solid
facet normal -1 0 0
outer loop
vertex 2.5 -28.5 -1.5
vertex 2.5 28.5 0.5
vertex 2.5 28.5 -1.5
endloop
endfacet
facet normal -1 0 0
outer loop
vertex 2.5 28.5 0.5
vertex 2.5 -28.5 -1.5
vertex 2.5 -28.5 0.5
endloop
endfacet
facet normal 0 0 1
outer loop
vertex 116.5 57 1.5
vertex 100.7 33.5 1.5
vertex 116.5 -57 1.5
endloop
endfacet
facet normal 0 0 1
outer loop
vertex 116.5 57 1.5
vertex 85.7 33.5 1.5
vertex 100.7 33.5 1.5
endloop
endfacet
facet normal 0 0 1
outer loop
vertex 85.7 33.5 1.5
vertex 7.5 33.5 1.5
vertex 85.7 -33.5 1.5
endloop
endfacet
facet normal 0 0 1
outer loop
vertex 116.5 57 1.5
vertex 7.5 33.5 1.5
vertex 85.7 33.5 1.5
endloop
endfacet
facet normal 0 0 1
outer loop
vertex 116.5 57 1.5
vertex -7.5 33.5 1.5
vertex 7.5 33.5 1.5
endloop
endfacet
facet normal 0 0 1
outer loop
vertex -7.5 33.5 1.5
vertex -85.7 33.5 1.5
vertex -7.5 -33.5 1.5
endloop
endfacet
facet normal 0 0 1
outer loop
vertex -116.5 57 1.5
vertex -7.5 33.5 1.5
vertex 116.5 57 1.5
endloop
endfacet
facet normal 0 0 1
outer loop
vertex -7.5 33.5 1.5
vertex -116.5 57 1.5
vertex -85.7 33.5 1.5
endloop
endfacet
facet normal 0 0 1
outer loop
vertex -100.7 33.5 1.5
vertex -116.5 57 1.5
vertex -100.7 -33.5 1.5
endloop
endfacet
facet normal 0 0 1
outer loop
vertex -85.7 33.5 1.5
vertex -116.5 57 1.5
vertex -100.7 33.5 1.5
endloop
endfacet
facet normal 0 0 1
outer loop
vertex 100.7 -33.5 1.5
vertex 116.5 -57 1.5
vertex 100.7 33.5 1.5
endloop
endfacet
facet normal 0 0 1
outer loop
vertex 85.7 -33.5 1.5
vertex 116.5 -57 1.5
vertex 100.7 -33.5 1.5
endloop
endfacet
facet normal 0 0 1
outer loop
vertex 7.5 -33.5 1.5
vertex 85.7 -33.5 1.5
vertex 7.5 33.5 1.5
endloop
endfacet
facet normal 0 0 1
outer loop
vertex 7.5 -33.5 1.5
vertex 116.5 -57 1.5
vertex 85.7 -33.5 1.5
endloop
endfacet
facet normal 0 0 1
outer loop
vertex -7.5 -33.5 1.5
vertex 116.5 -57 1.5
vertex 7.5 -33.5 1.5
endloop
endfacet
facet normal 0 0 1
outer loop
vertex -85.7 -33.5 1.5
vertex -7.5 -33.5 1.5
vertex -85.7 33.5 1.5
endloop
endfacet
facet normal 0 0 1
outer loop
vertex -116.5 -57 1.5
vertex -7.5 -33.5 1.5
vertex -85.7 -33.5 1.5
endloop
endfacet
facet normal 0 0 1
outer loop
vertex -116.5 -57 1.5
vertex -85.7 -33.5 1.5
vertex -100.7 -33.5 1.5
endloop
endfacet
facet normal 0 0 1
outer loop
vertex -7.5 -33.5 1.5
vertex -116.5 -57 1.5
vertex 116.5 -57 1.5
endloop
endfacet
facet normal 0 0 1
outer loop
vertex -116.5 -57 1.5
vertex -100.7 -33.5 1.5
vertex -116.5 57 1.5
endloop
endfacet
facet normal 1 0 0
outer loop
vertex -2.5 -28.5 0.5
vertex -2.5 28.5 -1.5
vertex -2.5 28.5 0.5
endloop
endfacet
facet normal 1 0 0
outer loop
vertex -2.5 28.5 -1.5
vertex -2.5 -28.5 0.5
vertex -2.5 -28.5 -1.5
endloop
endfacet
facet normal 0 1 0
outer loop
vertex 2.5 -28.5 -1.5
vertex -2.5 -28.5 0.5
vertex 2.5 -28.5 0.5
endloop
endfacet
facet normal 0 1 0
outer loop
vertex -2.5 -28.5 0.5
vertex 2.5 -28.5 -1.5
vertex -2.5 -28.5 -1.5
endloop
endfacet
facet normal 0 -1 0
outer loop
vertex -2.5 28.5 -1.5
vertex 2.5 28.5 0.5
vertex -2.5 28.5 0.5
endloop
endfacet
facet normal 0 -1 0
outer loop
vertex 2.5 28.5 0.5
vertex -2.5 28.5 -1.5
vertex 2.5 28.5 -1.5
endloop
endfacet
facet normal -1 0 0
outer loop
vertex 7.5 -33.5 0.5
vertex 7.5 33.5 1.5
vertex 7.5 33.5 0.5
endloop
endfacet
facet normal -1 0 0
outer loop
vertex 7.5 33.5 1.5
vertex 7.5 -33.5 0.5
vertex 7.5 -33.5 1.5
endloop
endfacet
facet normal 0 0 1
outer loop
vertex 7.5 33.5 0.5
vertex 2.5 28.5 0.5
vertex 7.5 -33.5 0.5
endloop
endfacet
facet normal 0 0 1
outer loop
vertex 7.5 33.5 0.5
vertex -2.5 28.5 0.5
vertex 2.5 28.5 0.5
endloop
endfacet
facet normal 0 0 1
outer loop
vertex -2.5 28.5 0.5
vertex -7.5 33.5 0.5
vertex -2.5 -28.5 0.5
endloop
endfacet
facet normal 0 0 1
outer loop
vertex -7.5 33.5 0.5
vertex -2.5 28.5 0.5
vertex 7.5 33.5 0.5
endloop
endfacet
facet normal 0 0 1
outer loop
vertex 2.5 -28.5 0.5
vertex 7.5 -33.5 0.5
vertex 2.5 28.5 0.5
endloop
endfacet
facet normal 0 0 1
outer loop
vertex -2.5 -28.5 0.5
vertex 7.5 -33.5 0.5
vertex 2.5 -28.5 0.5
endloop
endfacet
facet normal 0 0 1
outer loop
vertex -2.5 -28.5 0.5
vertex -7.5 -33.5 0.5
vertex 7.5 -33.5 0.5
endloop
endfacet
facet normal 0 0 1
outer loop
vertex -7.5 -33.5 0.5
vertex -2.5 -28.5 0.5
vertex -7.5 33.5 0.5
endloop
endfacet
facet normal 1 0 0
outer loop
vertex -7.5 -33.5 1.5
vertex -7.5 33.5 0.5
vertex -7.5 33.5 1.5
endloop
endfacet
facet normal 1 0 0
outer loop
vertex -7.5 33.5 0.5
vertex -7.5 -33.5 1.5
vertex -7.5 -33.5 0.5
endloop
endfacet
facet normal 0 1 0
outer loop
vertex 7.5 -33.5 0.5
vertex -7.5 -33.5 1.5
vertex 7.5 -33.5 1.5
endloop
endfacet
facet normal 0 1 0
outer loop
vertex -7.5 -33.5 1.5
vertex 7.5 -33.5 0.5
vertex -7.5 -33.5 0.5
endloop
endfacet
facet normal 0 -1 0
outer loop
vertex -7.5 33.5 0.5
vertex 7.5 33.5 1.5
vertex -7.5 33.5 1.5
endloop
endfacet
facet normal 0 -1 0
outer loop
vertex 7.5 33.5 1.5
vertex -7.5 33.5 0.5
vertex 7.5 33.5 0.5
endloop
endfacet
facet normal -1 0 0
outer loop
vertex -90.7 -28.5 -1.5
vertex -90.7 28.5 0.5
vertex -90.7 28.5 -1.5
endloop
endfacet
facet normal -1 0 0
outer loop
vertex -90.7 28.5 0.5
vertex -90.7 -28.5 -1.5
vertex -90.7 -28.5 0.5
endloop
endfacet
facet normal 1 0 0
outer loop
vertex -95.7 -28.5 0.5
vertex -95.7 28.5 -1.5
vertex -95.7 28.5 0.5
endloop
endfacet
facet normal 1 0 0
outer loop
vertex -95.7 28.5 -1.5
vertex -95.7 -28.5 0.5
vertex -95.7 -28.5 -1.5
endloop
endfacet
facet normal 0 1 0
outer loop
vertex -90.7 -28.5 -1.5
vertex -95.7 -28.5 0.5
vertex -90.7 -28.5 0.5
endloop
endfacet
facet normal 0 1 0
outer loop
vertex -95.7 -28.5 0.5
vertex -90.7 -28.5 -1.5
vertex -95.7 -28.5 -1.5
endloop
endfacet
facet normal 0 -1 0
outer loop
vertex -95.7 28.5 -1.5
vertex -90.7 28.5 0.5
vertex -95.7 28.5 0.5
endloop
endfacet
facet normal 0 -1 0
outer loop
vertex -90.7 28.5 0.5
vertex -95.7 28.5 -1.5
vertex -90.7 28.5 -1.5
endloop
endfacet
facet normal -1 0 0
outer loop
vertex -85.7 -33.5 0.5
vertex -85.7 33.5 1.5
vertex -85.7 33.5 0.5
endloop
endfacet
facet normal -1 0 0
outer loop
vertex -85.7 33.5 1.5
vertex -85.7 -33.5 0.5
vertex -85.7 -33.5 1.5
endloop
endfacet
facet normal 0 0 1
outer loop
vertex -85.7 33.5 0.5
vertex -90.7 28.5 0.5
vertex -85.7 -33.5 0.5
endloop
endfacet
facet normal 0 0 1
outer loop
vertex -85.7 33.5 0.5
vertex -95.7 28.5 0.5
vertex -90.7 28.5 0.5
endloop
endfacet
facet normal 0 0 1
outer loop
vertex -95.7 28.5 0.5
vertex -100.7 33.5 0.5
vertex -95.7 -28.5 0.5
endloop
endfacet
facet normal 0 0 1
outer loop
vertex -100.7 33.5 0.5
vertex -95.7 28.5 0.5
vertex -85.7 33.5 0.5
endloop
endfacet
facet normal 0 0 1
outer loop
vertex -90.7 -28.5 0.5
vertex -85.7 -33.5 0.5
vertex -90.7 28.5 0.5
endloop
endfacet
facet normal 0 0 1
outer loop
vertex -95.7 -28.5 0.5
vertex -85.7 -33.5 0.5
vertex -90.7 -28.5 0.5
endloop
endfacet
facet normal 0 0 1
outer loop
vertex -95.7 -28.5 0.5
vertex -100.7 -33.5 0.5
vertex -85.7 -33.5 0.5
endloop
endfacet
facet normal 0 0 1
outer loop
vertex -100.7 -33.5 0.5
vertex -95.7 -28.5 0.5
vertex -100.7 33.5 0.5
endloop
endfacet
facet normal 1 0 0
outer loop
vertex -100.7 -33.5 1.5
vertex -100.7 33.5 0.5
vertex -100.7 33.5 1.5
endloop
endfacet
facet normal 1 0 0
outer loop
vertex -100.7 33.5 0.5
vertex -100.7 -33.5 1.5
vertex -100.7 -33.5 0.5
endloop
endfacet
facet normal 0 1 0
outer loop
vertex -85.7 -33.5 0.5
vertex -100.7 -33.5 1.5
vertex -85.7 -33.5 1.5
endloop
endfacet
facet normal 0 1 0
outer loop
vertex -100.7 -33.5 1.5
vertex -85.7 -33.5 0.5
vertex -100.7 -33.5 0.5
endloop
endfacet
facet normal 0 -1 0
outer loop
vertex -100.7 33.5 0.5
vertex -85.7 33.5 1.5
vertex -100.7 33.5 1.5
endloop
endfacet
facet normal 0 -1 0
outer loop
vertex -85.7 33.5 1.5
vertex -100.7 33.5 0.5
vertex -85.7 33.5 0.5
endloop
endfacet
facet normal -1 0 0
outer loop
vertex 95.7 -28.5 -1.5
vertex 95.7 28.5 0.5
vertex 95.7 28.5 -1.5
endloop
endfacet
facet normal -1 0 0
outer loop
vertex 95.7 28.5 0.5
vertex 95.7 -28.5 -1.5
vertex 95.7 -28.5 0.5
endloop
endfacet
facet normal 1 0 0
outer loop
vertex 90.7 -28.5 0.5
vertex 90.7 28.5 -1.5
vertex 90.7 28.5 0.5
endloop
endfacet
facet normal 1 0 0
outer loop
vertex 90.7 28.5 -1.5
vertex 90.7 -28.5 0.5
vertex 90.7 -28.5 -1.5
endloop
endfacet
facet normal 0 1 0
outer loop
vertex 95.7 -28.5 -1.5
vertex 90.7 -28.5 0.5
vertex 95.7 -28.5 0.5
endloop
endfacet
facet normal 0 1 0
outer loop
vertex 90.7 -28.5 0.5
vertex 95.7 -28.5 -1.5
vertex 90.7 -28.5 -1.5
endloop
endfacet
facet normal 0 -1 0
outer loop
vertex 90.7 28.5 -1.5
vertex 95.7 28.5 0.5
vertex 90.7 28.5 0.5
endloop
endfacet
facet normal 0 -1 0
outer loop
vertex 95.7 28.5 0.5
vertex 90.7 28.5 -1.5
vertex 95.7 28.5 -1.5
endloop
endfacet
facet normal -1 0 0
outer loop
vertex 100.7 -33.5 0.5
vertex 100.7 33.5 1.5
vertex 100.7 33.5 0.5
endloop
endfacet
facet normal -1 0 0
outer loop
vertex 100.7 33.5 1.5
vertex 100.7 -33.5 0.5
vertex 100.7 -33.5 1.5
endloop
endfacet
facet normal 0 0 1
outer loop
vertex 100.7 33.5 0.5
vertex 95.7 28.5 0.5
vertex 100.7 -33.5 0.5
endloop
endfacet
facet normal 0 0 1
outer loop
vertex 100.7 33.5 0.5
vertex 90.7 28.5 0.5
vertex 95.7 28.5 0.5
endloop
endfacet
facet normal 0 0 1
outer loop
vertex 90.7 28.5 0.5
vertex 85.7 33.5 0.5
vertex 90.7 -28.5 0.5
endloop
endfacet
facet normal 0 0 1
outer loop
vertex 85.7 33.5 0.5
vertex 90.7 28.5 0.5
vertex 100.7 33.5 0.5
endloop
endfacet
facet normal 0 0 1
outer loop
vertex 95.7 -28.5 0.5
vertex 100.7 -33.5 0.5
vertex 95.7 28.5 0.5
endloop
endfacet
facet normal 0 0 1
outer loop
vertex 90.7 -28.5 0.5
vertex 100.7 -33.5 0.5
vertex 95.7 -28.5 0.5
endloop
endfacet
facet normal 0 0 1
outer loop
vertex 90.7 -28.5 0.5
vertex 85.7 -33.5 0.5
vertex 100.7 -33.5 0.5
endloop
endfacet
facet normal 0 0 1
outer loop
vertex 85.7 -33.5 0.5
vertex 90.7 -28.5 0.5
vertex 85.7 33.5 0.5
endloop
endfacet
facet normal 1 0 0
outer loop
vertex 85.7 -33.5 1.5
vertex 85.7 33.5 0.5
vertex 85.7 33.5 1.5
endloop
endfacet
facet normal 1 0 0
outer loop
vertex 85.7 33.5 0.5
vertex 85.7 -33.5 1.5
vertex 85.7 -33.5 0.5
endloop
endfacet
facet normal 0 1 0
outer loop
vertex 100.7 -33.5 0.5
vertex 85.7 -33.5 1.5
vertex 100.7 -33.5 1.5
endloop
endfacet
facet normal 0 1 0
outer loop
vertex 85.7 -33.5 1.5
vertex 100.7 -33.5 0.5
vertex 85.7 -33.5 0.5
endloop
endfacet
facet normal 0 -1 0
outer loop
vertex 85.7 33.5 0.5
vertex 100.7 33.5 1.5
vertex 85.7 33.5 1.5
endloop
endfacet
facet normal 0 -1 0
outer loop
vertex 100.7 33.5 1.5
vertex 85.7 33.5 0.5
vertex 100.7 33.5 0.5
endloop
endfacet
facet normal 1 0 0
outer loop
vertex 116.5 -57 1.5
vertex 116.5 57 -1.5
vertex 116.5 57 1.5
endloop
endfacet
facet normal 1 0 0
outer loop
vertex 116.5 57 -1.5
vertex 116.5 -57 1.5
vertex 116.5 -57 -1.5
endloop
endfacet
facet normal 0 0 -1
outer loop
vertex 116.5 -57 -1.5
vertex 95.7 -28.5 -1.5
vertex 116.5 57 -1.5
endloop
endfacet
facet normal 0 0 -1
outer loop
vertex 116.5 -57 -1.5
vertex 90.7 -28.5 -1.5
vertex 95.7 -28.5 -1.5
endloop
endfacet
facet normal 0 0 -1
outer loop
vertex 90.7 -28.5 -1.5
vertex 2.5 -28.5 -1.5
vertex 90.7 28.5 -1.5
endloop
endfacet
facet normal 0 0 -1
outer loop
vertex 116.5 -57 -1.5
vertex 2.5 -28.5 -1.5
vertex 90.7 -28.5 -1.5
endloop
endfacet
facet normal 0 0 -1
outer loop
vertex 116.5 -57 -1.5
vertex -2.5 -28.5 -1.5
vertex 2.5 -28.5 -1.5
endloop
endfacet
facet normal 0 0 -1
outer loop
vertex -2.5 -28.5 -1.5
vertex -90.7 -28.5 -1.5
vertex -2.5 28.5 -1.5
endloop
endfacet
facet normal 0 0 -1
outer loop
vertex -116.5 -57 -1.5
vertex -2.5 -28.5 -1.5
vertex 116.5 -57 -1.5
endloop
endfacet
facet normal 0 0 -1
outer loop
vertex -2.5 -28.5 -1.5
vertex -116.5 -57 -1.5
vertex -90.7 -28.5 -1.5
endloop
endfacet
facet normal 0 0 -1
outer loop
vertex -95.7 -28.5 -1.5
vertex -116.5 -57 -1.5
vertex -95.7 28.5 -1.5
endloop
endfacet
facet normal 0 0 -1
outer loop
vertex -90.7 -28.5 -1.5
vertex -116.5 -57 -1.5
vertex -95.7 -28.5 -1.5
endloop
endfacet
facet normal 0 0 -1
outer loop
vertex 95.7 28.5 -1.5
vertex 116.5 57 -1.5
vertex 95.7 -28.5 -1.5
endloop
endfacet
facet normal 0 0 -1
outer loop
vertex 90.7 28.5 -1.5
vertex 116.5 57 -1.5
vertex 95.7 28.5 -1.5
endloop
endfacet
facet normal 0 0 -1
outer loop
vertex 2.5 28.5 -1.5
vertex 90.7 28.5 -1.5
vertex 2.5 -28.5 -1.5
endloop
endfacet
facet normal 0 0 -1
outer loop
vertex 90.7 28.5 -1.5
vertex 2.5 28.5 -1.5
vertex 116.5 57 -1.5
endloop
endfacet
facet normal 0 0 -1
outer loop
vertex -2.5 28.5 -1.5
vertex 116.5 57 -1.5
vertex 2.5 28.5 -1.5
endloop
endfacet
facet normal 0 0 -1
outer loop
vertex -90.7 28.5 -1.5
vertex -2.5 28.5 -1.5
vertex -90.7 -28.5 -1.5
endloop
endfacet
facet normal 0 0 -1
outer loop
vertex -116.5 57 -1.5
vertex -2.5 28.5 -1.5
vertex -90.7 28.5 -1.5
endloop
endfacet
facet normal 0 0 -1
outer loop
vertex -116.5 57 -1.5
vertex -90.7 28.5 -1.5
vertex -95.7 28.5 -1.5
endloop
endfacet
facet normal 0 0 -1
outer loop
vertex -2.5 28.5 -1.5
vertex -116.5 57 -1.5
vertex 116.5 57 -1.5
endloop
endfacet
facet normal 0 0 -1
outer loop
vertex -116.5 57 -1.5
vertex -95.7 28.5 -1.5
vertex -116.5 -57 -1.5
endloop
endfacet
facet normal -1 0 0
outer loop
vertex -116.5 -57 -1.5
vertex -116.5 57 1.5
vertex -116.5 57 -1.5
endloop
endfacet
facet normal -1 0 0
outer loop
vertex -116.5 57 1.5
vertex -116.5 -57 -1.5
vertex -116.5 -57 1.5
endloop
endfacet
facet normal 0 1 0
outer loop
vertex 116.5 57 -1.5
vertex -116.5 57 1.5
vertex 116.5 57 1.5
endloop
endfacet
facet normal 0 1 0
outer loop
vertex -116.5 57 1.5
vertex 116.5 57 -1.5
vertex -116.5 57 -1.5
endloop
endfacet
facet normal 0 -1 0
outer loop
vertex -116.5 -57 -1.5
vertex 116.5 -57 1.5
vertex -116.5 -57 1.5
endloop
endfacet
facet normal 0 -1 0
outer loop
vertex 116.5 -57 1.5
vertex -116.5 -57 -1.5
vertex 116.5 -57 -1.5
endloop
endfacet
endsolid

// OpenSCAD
// file: stand.scad
/*
 * SPDX-FileCopyrightText: © 2024 Brian S. Stephan <bss@incorporeal.org>
 * SPDX-License-Identifier: GPL-3.0-or-later
 */

include <../parameters.scad>
include <../components.scad>

base_extra = 10;
back_extra_multiplier = 4.25;
rotation_alignment = 15;

module stand() {
	difference() {
		union() {
			/* front lip piece */
			translate([0, 0, stand_z/2]) cube([stand_x, stand_y, stand_z], center=true);
			/* back supporting piece */
			translate([0, (stand_y-rotation_alignment)/4, stand_z*back_extra_multiplier/2])
				cube([stand_x, (stand_y+rotation_alignment)/2, stand_z*back_extra_multiplier], center=true);
			/* base */
			translate([0, 0, 0.5]) cube([stand_x+base_extra, stand_y+base_extra, 1], center=true);
		}
		/* cut out the actual frame solid */
		translate([0, rotation_alignment, (frame_y/2)+7]) rotate([65, 0, 0]) frame_solid();
	}
}

stand();
// file: ../parameters.scad
/*
 * SPDX-FileCopyrightText: © 2023 Brian S. Stephan <bss@incorporeal.org>
 * SPDX-License-Identifier: GPL-3.0-or-later
 */

// adjustments
hole_tolerance = 0.15;

// M2
m2_screw_selftap_radius = 0.95;

// M3
m3_screw_selftap_radius = 1.3;

// M4
m4_bolt_radius = 2 + hole_tolerance;
m4_bolt_countersink_radius = 6.1 + hole_tolerance;
m4_bolt_hex_exterior_radius = 3.6 + hole_tolerance;

// 24mm button
small_button_radius = 12 + hole_tolerance;

// 30mm button
big_button_radius = 15 + hole_tolerance;

// JLF mount dimensions
lever_mount_x = 53;
lever_mount_y = 95;
lever_mount_z = 2;

// standard lever hole
lever_plate_hole = 12;

// case dimensions
// base frame box. reminder: top of inside (including mounts) is chopped by panel_z for plates
frame_x = 233;
frame_y = 208;
frame_z = 57;

// stand dimensions to display a stick
stand_x = 5;
stand_y = frame_z;
stand_z = 15;

// degree to which the extended frame pieces stick out from the end of the frame
frame_extension_x = 25;
frame_extension_y = 25;

// this sinks the bottom and top of the frame inward a bit, and is used to math out two shapes
// when creating the frame box / overhang panel
frame_bevel_height = 2;
overhang_panel_bevel_height = 1;

frame_center_to_neutrik = 70;

// depth of the "lip" of the frame that the top plate sets into/supports the overhang
frame_wall = 4;

// width of the column in the frame corners to support the hex bolt
frame_mount_column_width = 20;

// per neutrik (mm)
neutrik_panel_thickness = 3;

// top plate, which can either be the whole plate ("inset") or the mounting frame for a plate that overhangs
panel_x = frame_x - (frame_wall * 2);
panel_y = frame_y - (frame_wall * 2);
panel_z = 5;

// how much the top plate x/y is expanded to overhang the frame
// note that this is relative to the top plate (so the wall is added back)
panel_overhang_amount = 8.5;
overhang_panel_x = panel_x + (frame_wall * 2) + (panel_overhang_amount * 2);
overhang_panel_y = panel_y + (frame_wall * 2) + (panel_overhang_amount * 2);

panel_to_frame_point_x = (panel_x/2)-10;
panel_to_frame_point_y = (panel_y/2)-10;

// frame interior that supports the top plates
panel_support_width = 5;

// neutrik D screw holes
neutrik_d_screw_radius = 1.6 + hole_tolerance;
neutrik_d_radius = 12 + hole_tolerance;

// additional button radius for decorative panels, etc.
decorative_radius_scale = 1.75;
jumbo_decorative_radius_scale = 2;
// main file
/*
 * SPDX-FileCopyrightText: © 2024 Brian S. Stephan <bss@incorporeal.org>
 * SPDX-License-Identifier: GPL-3.0-or-later
 */

include <../parameters.scad>
include <../components.scad>
use <stand.scad>

module stand_base() {
	difference() {
		cube([frame_x, stand_y*2, 3], center=true);
		translate([0, 0, 1.5]) rotate([180, 0, 0]) stand();
		translate([-frame_x*0.4, 0, 1.5]) rotate([180, 0, 0]) stand();
		translate([frame_x*0.4, 0, 1.5]) rotate([180, 0, 0]) stand();
	}
}

stand_base();
